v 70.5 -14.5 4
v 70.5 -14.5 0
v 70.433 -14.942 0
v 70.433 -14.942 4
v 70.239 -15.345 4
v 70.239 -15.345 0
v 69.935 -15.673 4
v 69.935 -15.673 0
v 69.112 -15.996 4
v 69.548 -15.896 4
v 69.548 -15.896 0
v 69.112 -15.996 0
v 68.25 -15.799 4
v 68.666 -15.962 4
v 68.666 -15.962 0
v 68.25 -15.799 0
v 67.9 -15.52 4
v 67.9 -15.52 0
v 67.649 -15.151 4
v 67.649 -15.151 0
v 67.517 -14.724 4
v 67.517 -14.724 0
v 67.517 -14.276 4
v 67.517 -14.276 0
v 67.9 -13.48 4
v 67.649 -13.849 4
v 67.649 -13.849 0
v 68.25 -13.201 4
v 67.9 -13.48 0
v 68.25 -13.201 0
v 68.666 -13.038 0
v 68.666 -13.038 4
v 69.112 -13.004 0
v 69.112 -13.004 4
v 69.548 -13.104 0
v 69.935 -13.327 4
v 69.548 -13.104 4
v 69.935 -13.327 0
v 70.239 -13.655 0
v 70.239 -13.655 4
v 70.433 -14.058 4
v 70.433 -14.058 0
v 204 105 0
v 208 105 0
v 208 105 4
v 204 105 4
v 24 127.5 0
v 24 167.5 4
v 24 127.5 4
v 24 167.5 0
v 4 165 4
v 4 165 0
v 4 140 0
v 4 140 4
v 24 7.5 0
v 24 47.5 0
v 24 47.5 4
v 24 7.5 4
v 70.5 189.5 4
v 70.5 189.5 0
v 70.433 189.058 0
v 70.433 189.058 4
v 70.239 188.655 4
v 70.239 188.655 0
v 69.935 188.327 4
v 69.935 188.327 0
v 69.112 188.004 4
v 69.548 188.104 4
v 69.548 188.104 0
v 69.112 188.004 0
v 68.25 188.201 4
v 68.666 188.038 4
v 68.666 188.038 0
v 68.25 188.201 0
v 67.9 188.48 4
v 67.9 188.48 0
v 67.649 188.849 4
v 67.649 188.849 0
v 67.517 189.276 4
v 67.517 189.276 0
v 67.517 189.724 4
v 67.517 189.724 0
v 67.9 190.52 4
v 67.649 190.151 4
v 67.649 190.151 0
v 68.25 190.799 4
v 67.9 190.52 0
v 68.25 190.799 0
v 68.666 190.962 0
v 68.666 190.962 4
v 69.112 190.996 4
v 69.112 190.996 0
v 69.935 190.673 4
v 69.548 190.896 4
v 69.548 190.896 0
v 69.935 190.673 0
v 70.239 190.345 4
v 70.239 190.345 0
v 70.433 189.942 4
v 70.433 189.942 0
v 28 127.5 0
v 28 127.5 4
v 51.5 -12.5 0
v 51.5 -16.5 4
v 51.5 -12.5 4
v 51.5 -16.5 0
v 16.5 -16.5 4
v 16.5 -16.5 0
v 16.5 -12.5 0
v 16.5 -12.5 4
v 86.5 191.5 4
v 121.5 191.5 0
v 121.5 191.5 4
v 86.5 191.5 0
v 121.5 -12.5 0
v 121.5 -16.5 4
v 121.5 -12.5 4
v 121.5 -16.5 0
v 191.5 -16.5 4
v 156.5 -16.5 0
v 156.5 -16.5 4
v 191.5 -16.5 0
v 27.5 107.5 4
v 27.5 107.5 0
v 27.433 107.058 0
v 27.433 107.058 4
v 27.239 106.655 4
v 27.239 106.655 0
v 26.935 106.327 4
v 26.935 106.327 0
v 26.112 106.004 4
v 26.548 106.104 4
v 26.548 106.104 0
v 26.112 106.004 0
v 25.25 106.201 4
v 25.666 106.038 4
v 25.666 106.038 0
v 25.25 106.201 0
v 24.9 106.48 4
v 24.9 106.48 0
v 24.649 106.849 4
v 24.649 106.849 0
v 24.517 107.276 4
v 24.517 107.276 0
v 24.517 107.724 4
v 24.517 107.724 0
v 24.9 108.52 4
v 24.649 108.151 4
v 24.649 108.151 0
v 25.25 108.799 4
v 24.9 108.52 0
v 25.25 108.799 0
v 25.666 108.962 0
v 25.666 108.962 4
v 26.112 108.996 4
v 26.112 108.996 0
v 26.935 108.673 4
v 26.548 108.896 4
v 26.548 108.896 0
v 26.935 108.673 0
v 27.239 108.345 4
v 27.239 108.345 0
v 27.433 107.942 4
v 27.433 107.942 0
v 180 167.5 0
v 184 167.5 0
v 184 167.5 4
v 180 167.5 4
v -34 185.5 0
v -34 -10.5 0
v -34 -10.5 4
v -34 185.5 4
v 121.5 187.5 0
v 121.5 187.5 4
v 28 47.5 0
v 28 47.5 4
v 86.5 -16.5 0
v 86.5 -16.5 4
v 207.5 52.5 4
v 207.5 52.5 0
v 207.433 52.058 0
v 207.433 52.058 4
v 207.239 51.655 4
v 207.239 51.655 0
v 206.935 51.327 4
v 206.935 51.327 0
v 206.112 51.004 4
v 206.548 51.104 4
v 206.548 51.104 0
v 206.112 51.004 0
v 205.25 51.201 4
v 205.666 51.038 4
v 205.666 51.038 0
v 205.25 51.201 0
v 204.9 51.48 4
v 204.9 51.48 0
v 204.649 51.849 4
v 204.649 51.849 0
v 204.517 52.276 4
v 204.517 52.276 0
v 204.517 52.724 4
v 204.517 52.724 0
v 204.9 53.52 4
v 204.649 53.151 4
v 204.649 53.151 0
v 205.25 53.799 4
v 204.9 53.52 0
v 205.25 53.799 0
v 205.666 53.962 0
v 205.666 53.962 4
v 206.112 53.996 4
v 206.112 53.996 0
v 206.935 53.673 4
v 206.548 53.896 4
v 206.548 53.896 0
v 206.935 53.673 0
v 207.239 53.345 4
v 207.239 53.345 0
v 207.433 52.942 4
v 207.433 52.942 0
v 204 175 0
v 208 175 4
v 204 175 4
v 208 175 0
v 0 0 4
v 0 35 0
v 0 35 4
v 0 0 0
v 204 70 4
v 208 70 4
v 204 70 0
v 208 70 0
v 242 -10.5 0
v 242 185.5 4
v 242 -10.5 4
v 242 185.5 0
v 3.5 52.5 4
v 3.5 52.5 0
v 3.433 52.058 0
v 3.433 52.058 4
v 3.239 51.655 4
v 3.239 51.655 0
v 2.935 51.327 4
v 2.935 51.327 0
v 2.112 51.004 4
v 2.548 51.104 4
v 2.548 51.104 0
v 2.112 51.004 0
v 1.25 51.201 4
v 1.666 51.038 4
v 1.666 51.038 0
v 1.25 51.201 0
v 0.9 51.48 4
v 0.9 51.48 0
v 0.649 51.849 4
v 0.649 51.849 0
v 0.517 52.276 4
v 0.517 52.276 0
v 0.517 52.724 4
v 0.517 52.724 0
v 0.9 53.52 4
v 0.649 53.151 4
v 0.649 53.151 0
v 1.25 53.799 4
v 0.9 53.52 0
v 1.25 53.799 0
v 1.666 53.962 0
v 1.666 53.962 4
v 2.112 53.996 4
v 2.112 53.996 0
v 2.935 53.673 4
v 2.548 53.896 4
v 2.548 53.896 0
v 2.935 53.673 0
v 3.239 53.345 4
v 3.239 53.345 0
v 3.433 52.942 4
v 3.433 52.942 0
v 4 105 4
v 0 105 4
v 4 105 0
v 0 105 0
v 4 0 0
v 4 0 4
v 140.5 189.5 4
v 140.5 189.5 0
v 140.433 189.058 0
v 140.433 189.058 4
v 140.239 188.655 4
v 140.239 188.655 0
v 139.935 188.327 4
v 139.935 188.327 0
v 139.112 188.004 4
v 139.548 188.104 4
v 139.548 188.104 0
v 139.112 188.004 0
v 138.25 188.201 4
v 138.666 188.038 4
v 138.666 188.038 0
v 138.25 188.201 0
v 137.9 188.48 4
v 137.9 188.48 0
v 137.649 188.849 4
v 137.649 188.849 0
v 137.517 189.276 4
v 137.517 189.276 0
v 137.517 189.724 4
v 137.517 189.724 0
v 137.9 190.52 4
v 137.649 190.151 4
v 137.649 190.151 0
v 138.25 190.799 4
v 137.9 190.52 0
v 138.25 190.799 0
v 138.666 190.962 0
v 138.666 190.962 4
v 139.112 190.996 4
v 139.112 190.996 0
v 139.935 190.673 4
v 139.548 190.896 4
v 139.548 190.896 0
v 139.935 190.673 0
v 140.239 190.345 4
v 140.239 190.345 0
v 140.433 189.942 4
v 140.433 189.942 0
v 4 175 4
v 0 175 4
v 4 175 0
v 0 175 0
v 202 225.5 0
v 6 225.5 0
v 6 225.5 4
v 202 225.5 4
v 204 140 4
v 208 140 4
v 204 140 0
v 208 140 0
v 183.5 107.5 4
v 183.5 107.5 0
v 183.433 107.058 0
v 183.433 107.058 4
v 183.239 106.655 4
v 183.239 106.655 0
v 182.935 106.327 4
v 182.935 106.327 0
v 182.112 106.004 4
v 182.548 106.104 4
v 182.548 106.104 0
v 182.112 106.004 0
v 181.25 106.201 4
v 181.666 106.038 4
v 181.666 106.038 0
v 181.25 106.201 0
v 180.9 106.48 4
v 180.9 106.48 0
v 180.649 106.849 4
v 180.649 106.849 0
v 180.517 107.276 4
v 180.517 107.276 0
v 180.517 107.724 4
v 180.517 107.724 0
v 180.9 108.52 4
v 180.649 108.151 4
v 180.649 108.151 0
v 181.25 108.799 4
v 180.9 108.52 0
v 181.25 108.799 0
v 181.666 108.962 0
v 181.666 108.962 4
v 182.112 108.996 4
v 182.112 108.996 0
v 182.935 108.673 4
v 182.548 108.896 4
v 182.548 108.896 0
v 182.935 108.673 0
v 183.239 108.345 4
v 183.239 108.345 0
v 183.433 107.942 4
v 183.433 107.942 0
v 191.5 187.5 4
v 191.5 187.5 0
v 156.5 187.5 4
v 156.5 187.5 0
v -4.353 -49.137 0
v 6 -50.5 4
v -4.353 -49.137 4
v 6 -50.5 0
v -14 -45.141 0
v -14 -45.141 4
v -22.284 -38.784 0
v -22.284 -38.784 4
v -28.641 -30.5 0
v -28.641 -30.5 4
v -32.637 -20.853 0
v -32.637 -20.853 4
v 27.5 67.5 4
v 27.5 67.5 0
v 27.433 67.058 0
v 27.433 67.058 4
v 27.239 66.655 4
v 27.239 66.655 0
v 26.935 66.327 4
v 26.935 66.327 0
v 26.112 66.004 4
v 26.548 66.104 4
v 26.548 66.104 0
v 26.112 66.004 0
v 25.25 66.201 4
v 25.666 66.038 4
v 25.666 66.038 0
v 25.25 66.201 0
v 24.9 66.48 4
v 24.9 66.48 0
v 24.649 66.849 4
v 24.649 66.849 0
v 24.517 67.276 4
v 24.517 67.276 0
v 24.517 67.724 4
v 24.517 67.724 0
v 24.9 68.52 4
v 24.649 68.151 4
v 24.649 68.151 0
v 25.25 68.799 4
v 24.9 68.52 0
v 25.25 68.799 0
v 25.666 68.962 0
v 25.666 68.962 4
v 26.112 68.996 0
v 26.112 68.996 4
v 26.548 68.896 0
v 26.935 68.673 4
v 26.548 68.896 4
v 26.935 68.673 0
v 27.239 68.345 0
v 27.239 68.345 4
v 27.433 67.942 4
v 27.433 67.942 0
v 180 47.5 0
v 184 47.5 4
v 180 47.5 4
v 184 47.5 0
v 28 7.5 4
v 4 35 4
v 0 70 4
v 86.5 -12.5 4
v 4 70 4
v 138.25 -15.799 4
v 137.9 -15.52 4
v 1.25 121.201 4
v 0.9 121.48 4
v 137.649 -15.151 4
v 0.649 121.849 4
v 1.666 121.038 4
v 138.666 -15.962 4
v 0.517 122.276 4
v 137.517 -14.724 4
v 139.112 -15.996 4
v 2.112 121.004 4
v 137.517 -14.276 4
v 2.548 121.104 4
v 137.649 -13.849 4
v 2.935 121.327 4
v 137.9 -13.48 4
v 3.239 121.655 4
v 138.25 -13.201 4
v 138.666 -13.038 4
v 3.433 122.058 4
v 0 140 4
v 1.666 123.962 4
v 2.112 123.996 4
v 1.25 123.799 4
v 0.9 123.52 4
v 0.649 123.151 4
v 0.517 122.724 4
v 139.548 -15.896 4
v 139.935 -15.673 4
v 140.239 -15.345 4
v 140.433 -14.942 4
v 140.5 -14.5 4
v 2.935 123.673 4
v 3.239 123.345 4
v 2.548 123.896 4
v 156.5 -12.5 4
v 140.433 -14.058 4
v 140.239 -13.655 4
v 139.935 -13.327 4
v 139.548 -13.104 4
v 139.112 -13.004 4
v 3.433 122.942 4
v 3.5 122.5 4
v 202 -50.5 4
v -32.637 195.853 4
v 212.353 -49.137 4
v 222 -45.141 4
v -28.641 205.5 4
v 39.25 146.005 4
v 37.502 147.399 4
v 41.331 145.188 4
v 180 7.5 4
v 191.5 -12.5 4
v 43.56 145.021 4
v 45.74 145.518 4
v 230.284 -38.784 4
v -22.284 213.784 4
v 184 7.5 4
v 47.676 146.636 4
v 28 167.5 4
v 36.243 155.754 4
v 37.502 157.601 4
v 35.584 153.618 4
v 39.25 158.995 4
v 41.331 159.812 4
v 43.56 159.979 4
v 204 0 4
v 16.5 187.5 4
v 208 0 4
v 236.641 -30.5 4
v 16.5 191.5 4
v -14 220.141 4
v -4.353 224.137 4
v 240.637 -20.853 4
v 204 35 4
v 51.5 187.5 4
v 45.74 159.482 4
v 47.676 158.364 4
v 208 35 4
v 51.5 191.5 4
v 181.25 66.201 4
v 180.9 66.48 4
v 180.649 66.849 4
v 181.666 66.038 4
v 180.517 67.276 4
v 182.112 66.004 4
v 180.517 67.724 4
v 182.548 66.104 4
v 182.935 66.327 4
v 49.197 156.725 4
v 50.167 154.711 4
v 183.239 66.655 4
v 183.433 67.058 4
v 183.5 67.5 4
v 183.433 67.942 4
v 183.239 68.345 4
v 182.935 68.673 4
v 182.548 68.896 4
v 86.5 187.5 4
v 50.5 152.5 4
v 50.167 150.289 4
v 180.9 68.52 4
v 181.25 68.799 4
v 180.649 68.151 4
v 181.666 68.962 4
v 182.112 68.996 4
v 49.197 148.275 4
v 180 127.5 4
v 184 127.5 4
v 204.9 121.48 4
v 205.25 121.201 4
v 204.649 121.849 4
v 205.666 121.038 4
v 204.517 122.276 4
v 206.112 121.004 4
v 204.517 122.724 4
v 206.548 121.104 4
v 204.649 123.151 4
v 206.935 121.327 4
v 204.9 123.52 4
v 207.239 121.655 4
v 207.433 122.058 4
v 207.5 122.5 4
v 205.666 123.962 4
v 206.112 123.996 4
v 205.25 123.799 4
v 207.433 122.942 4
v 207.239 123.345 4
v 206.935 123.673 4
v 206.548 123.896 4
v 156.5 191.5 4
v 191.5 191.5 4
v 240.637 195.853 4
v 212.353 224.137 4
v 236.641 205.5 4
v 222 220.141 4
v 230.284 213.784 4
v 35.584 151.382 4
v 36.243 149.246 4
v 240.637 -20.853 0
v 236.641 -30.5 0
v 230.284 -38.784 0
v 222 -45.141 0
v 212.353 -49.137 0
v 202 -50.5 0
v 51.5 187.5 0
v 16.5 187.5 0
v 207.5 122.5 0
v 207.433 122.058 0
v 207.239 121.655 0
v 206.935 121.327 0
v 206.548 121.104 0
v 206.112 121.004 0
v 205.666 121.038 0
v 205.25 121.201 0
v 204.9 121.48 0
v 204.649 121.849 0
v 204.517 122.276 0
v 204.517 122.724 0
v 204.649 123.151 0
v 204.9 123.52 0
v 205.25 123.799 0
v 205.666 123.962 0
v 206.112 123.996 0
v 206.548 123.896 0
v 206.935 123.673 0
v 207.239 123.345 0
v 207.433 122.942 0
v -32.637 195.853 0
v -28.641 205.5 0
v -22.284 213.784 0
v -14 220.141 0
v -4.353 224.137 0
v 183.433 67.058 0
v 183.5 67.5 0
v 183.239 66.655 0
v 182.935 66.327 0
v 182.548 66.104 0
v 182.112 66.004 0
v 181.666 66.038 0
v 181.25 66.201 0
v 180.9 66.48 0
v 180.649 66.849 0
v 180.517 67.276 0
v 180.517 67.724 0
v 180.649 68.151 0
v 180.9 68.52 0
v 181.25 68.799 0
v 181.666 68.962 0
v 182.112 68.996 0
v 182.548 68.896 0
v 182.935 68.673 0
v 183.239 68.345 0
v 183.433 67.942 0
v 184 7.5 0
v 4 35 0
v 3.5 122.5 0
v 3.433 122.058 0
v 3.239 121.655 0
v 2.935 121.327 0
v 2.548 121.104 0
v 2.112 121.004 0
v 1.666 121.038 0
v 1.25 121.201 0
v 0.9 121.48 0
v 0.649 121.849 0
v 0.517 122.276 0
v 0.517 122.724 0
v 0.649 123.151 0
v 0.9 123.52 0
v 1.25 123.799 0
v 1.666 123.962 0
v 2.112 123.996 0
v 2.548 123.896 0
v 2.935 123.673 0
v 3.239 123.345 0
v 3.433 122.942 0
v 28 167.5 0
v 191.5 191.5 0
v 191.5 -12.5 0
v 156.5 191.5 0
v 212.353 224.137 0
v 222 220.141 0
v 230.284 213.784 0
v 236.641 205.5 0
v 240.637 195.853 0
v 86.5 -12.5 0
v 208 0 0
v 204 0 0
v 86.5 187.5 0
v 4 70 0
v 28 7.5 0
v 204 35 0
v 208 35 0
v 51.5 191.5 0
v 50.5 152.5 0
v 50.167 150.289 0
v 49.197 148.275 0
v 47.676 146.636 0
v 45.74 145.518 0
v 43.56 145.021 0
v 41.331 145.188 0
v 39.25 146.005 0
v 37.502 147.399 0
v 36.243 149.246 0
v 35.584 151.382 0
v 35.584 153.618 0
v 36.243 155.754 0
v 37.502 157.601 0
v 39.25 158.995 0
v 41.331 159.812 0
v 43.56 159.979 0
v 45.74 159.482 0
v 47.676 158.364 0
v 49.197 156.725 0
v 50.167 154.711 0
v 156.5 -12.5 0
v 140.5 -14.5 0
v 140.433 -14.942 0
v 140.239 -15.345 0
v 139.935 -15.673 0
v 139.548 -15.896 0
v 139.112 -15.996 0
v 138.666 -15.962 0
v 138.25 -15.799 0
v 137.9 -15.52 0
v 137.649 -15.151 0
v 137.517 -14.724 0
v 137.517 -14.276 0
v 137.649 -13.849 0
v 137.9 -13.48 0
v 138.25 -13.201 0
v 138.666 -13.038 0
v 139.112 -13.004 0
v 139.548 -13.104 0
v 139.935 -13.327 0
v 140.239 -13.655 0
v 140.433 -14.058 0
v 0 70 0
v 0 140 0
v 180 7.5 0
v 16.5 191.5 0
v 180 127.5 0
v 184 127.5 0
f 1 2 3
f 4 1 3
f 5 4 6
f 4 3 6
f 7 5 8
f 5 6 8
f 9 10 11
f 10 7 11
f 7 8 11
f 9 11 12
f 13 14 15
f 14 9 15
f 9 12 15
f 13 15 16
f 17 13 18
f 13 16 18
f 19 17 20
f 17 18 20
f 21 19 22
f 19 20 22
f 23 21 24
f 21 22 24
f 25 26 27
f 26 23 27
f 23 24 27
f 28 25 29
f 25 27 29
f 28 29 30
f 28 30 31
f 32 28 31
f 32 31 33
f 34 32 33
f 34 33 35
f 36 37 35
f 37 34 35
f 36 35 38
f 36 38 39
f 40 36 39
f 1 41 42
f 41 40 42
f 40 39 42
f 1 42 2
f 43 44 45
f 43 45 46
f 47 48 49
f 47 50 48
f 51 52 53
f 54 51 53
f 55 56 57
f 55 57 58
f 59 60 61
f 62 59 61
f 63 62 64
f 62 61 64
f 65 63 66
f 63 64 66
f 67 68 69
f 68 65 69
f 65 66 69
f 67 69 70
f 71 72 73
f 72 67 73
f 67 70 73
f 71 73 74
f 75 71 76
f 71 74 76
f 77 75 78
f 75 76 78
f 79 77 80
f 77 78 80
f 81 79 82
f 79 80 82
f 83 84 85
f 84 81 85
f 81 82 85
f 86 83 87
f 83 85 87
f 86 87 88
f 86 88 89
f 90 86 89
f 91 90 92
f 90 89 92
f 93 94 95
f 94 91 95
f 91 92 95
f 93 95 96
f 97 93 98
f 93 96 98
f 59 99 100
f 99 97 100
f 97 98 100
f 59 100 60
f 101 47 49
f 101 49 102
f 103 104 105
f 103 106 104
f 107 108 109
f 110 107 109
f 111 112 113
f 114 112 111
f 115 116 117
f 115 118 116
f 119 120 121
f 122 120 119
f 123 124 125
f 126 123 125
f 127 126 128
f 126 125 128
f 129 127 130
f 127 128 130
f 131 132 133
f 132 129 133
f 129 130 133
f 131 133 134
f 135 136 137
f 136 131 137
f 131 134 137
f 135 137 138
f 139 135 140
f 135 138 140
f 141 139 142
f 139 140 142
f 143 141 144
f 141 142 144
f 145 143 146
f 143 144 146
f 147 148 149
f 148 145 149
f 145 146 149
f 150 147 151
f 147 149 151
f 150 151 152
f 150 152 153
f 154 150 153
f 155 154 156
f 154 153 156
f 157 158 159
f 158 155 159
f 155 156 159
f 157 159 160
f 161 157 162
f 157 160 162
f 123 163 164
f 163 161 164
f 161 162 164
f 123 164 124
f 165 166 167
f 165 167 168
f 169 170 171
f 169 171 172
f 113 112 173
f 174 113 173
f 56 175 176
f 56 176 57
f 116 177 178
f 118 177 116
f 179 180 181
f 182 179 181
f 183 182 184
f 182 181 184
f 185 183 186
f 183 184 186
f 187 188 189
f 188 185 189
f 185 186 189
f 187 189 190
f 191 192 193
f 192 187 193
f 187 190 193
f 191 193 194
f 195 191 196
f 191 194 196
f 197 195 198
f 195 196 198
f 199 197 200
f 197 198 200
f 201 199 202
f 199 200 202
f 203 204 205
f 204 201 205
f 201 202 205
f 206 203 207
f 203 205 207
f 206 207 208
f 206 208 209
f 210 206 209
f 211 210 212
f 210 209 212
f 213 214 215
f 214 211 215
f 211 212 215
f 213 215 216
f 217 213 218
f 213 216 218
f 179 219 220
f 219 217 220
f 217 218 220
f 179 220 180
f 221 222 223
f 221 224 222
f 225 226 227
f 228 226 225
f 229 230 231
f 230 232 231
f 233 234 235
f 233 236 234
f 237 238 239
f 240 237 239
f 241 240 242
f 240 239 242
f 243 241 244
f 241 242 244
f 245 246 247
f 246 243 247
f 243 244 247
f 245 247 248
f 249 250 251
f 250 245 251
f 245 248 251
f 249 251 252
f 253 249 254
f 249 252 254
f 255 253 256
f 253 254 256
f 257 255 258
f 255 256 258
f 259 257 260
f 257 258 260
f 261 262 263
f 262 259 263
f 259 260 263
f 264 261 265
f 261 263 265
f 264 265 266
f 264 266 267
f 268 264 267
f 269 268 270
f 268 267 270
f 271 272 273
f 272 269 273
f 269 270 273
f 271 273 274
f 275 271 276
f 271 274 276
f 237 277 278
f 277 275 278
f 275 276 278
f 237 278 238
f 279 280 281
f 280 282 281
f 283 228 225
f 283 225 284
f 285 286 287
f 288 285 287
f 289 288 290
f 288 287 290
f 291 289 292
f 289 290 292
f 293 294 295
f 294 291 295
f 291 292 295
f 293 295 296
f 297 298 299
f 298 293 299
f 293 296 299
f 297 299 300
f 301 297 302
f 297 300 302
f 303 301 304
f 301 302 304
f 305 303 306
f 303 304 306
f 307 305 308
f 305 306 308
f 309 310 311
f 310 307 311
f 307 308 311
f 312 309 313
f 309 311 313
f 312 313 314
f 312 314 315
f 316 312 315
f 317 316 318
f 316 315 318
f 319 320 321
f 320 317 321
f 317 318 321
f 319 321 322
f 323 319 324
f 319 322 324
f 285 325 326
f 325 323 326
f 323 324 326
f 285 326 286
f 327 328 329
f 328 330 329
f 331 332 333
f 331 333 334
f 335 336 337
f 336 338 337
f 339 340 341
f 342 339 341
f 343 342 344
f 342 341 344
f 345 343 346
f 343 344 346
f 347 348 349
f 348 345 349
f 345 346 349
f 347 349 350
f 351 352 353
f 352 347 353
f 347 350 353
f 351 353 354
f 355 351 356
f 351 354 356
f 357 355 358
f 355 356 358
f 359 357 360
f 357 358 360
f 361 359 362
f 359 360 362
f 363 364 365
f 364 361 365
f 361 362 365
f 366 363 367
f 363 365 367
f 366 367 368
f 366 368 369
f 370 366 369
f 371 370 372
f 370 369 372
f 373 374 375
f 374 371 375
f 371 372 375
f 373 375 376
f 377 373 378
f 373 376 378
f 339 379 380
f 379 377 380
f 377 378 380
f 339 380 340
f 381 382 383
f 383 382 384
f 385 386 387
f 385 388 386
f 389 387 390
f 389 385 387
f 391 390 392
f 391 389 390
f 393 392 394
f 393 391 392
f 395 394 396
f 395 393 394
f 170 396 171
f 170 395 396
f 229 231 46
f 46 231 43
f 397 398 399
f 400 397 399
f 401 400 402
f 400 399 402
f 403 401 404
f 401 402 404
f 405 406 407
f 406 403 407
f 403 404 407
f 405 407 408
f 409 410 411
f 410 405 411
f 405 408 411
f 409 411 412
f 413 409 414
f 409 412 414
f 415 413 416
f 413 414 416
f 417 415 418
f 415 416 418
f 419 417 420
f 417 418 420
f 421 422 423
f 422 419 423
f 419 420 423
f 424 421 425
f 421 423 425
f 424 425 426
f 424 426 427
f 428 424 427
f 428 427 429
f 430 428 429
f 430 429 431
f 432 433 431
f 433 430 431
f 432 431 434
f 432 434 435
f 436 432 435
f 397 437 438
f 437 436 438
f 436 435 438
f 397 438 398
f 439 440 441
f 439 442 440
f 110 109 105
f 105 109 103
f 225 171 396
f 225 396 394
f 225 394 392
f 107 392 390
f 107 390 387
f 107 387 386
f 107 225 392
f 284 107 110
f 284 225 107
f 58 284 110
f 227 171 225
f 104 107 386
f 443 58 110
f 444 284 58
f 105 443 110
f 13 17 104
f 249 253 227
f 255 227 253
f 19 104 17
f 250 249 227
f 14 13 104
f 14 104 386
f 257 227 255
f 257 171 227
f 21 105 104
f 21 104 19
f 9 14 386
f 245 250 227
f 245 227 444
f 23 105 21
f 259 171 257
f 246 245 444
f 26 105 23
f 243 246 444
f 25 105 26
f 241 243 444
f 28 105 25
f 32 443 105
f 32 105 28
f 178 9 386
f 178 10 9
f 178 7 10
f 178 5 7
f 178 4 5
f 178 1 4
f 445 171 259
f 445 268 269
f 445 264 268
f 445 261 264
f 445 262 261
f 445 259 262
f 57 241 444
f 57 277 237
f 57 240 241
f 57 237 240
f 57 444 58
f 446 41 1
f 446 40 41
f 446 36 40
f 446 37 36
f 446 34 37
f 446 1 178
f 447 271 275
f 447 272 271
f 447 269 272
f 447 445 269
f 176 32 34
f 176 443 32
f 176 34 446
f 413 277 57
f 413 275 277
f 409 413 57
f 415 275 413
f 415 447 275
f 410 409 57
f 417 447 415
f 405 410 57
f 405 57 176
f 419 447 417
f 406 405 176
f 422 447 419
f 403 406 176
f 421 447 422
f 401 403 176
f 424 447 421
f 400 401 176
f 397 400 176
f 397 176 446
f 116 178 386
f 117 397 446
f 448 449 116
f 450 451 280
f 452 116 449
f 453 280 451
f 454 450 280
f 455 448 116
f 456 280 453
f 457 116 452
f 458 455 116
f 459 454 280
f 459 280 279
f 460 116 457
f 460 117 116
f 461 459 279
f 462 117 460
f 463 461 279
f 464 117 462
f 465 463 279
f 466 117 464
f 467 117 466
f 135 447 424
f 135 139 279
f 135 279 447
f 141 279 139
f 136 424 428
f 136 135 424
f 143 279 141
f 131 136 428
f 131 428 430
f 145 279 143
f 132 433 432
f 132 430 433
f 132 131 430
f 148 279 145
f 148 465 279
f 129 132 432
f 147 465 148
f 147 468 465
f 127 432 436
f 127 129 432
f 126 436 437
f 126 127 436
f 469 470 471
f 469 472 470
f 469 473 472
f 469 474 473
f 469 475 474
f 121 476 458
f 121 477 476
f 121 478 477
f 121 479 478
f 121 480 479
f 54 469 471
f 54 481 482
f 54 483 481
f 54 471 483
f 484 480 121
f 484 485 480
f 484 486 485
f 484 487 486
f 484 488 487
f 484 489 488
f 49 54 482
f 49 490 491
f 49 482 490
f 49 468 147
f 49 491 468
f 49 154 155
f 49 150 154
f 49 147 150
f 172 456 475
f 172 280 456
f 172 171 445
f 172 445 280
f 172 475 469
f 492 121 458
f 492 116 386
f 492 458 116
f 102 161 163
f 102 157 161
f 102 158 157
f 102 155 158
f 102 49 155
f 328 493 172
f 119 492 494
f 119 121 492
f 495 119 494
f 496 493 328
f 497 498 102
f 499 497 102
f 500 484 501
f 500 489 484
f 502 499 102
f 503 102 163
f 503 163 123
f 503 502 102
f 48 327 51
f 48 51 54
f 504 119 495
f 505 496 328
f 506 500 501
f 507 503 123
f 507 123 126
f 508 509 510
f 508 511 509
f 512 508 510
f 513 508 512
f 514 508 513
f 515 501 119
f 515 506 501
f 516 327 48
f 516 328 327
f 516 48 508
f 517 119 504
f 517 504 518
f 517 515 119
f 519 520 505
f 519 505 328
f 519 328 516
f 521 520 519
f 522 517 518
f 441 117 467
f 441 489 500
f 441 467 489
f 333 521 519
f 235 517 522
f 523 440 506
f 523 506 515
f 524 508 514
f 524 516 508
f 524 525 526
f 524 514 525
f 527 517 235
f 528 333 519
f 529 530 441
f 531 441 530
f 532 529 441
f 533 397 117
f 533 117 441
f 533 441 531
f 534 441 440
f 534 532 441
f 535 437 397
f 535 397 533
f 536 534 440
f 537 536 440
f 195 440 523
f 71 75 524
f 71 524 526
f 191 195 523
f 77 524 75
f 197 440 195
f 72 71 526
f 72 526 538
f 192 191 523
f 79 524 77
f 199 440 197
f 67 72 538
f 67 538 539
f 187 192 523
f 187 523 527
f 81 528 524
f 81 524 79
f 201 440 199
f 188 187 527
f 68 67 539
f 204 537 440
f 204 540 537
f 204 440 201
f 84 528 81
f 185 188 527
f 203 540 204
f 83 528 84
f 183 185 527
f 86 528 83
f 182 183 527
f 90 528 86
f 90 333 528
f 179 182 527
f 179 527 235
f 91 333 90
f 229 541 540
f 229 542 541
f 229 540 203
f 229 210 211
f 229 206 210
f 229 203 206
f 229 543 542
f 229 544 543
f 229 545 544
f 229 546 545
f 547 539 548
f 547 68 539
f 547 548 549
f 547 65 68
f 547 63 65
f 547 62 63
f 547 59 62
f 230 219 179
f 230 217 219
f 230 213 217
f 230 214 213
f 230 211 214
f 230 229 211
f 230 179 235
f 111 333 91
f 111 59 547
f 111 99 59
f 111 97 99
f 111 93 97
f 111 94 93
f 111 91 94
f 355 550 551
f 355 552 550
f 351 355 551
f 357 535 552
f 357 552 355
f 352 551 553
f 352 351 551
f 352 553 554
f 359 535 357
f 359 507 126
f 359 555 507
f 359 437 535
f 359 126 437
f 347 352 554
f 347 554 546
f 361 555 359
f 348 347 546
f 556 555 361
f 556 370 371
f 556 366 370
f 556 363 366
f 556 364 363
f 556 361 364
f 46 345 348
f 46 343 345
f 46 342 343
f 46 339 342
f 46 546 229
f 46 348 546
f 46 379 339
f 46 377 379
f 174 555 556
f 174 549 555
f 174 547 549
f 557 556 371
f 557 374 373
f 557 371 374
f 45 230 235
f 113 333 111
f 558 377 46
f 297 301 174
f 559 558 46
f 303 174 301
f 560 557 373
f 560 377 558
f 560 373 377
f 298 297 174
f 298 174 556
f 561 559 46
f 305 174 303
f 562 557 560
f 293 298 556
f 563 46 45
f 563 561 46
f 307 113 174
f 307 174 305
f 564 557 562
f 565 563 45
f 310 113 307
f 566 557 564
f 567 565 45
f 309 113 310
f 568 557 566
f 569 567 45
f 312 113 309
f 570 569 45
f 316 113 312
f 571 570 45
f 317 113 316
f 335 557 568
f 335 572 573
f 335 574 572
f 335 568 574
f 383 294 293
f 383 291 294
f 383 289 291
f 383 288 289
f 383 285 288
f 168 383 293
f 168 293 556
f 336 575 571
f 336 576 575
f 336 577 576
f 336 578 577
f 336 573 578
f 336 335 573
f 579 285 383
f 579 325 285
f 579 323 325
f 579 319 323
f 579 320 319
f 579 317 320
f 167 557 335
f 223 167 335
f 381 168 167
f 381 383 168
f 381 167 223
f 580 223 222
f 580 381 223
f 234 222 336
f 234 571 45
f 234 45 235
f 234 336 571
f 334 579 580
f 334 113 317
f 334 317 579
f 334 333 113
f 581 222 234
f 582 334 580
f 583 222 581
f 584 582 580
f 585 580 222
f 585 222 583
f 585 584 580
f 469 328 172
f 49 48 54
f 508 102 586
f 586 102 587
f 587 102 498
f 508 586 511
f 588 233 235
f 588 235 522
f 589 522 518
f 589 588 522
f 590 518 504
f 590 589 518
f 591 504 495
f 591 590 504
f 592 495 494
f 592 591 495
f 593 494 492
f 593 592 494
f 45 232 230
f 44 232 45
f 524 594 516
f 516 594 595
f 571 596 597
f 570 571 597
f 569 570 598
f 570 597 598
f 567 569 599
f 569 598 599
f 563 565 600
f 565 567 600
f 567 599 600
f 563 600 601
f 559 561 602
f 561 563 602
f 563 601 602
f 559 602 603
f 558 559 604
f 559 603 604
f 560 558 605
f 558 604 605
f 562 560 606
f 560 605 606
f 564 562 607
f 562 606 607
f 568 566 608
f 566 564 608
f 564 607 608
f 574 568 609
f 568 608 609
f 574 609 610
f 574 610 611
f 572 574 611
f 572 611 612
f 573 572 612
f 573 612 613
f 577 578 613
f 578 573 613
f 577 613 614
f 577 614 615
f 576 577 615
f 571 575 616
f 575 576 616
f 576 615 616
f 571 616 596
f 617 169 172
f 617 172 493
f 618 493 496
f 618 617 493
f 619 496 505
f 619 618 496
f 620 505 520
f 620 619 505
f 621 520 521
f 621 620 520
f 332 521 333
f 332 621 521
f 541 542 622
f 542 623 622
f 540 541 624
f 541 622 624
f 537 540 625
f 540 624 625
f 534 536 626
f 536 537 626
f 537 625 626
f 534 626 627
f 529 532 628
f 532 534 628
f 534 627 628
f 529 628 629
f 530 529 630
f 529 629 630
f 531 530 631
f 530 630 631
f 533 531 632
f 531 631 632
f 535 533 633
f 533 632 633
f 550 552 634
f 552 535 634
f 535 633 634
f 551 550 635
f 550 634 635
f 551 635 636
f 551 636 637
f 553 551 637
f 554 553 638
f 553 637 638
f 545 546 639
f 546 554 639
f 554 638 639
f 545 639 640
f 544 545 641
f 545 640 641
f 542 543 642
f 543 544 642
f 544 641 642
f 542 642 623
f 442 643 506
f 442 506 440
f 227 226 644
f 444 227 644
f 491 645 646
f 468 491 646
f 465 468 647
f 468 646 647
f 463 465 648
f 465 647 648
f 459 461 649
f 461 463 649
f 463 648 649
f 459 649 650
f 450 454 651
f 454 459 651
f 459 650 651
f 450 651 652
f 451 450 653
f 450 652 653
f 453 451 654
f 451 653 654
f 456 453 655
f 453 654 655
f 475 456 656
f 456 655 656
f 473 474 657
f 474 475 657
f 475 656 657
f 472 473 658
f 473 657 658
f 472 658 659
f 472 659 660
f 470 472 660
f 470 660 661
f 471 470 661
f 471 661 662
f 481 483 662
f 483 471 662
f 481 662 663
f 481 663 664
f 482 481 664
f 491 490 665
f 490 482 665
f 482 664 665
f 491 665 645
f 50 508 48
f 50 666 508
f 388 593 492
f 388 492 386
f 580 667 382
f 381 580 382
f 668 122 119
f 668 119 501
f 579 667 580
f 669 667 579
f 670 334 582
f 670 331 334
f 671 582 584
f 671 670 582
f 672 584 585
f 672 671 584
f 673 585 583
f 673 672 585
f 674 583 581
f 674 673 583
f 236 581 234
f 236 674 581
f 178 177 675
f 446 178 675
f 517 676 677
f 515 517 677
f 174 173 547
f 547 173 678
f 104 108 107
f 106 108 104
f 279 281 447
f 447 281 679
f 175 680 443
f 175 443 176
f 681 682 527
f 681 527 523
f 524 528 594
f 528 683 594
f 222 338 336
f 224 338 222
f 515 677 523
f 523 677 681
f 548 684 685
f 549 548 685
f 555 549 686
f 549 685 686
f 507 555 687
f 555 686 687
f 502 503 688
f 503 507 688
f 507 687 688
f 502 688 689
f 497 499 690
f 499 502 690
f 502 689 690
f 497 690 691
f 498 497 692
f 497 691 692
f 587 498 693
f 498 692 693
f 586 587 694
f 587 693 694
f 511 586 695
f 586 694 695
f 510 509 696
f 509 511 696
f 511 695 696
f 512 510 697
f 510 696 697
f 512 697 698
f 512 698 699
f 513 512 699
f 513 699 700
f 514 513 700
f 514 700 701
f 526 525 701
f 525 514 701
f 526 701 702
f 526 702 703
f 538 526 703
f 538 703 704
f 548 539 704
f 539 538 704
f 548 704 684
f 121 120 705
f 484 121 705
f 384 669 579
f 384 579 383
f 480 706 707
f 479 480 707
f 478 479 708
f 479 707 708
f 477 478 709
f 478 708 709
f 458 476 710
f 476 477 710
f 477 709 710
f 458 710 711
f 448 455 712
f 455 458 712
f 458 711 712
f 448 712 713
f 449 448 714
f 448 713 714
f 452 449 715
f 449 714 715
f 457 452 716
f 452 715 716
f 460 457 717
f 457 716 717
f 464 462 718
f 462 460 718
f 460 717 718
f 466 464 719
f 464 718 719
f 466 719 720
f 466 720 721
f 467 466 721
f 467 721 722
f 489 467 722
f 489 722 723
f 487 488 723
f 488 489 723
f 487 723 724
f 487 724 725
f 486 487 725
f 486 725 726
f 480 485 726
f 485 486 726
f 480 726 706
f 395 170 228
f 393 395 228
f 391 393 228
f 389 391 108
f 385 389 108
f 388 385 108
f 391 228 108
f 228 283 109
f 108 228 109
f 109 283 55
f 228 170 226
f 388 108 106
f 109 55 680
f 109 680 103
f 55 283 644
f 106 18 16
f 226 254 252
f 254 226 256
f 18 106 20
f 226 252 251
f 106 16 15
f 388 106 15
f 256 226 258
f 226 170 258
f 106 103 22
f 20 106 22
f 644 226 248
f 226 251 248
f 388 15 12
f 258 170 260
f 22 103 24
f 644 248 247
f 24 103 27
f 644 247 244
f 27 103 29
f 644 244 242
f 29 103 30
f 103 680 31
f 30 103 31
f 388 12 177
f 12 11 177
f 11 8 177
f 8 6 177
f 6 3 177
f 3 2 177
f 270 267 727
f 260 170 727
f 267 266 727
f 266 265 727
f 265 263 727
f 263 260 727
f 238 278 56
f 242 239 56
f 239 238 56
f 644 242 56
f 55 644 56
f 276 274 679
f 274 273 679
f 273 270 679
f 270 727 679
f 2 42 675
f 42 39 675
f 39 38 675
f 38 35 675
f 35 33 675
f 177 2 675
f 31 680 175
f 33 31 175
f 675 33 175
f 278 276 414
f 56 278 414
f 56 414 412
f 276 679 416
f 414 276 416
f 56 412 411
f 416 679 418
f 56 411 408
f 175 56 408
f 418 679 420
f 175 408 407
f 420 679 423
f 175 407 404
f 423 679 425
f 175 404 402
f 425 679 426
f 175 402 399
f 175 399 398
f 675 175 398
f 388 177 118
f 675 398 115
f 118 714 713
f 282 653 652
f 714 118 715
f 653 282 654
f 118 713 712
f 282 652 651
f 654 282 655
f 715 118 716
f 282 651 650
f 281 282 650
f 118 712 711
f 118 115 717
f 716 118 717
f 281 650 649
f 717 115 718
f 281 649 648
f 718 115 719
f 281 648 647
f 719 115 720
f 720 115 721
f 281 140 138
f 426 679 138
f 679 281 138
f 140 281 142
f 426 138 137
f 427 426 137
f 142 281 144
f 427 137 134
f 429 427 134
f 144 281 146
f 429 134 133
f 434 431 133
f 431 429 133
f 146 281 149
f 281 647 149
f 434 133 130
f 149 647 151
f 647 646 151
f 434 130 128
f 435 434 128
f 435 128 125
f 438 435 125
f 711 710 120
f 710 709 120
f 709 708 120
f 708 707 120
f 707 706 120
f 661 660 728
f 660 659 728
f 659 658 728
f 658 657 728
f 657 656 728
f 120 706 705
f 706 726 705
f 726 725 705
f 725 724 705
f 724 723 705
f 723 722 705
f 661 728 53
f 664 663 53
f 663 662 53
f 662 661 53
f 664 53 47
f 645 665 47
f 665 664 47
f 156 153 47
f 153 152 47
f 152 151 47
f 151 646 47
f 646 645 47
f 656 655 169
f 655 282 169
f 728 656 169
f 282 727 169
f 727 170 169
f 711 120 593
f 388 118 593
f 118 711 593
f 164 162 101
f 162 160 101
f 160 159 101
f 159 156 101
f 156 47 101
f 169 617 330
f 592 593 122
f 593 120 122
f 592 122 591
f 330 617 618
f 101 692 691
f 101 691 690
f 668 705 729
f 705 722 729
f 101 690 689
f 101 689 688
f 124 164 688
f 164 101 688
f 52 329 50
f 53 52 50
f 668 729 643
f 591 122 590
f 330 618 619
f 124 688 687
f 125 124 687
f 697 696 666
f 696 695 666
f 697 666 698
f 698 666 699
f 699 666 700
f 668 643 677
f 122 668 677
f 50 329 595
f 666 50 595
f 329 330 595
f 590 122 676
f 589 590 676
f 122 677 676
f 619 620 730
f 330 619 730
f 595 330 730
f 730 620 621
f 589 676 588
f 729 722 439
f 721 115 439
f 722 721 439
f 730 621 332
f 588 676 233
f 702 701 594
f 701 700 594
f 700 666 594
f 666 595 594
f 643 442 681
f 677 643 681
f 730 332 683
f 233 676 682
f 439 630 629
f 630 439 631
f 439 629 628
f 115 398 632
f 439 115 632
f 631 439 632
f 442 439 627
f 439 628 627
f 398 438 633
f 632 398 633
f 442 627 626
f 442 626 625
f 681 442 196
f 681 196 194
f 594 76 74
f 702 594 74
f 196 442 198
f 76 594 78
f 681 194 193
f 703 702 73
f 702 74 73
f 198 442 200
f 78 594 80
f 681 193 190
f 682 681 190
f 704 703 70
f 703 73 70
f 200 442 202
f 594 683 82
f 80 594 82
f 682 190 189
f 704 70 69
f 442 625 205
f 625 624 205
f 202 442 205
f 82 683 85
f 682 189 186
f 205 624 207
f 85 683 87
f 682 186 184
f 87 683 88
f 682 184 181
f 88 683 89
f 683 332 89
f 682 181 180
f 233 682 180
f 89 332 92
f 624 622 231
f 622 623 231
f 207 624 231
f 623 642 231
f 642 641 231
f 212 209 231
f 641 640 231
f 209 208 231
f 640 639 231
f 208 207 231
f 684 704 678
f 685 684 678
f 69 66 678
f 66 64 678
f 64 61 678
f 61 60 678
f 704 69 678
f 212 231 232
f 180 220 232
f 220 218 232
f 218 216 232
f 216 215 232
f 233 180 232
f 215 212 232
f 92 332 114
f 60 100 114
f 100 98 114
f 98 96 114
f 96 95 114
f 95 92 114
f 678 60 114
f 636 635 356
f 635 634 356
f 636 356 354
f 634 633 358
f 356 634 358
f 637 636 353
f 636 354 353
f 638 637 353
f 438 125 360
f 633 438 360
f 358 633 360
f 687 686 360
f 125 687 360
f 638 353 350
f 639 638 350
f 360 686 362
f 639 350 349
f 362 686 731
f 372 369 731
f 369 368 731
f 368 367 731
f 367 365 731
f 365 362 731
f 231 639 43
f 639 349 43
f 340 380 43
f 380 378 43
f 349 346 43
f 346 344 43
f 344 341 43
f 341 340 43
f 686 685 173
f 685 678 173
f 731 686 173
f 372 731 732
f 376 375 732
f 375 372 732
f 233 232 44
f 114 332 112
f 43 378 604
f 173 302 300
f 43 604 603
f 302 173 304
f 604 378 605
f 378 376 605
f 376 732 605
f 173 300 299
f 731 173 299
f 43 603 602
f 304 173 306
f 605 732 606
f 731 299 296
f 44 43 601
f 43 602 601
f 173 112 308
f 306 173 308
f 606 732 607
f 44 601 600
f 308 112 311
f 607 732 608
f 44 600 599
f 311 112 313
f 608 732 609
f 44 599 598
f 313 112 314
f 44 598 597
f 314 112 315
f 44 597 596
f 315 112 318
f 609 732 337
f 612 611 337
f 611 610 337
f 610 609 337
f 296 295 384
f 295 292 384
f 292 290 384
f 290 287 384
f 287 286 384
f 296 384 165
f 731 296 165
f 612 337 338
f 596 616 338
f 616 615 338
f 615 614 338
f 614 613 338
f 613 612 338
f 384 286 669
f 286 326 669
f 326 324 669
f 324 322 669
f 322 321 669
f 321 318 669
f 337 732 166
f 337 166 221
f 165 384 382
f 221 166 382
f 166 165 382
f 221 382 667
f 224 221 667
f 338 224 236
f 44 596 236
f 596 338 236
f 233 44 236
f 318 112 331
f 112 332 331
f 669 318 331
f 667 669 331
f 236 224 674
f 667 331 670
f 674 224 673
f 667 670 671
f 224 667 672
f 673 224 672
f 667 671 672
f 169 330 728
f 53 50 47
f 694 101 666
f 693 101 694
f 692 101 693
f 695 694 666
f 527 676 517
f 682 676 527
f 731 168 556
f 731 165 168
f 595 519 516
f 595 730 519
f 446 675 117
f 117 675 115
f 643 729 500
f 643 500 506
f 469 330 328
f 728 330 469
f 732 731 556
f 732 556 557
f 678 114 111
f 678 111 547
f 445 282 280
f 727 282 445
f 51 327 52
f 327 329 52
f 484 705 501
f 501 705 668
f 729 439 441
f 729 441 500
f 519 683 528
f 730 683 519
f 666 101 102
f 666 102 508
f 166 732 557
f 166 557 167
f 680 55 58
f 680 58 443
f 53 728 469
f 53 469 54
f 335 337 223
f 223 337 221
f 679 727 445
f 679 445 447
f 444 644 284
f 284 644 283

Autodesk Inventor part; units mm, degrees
ref_plane "YZ Plane" through (0, 0, 0) normal (1, 0, 0) x (0, 1, 0)
ref_plane "XZ Plane" through (0, 0, 0) normal (0, 1, 0) x (-1, 0, 0)
ref_plane "XY Plane" through (0, 0, 0) normal (0, 0, 1) x (1, 0, 0)
sketch "Sketch1" plane through (0, 0, 0) normal (0, 0, 1) x (1, 0, 0)
  line L0 (6, 225.5) -> (202, 225.5)
  line L1 (242, 185.5) -> (242, -10.5)
  line L2 (202, -50.5) -> (6, -50.5)
  line L3 (-34, -10.5) -> (-34, 185.5)
  line L4 (208, 237.5) -> (0, 237.5) construction
  line L5 (-46, 191.5) -> (-46, -16.5) construction
  arc A0 (0, 237.5) -> (-46, 191.5) centre (0, 191.5) ccw construction
  arc A1 (6, 225.5) -> (-34, 185.5) centre (6, 185.5) ccw
  arc A2 (242, 185.5) -> (202, 225.5) centre (202, 185.5) ccw
  arc A3 (202, -50.5) -> (242, -10.5) centre (202, -10.5) ccw
  arc A4 (-34, -10.5) -> (6, -50.5) centre (6, -10.5) ccw
  line L6 (51.5, 191.5) -> (16.5, 191.5) projected
  line L7 (16.5, 191.5) -> (16.5, 187.5) projected
  line L8 (51.5, 187.5) -> (16.5, 187.5) projected
  line L9 (51.5, 191.5) -> (51.5, 187.5) projected
  line L10 (121.5, 191.5) -> (86.5, 191.5) projected
  line L11 (86.5, 191.5) -> (86.5, 187.5) projected
  line L12 (121.5, 187.5) -> (86.5, 187.5) projected
  line L13 (121.5, 191.5) -> (121.5, 187.5) projected
  line L14 (191.5, 191.5) -> (156.5, 191.5) projected
  line L15 (156.5, 191.5) -> (156.5, 187.5) projected
  line L16 (191.5, 187.5) -> (156.5, 187.5) projected
  line L17 (191.5, 191.5) -> (191.5, 187.5) projected
  line L18 (208, 140) -> (208, 175) projected
  line L19 (208, 175) -> (204, 175) projected
  line L20 (204, 140) -> (204, 175) projected
  line L21 (208, 140) -> (204, 140) projected
  line L22 (208, 70) -> (208, 105) projected
  line L23 (208, 105) -> (204, 105) projected
  line L24 (204, 70) -> (204, 105) projected
  line L25 (208, 70) -> (204, 70) projected
  line L26 (208, 0) -> (208, 35) projected
  line L27 (208, 35) -> (204, 35) projected
  line L28 (204, 0) -> (204, 35) projected
  line L29 (208, 0) -> (204, 0) projected
  line L30 (156.5, -16.5) -> (191.5, -16.5) projected
  line L31 (191.5, -16.5) -> (191.5, -12.5) projected
  line L32 (156.5, -12.5) -> (191.5, -12.5) projected
  line L33 (156.5, -16.5) -> (156.5, -12.5) projected
  line L34 (86.5, -16.5) -> (121.5, -16.5) projected
  line L35 (121.5, -16.5) -> (121.5, -12.5) projected
  line L36 (86.5, -12.5) -> (121.5, -12.5) projected
  line L37 (86.5, -16.5) -> (86.5, -12.5) projected
  line L38 (16.5, -16.5) -> (51.5, -16.5) projected
  line L39 (51.5, -16.5) -> (51.5, -12.5) projected
  line L40 (16.5, -12.5) -> (51.5, -12.5) projected
  line L41 (16.5, -16.5) -> (16.5, -12.5) projected
  line L42 (0, 35) -> (0, 0) projected
  line L43 (0, 0) -> (4, 0) projected
  line L44 (4, 35) -> (4, 0) projected
  line L45 (0, 35) -> (4, 35) projected
  line L46 (0, 105) -> (0, 70) projected
  line L47 (0, 70) -> (4, 70) projected
  line L48 (4, 105) -> (4, 70) projected
  line L49 (0, 105) -> (4, 105) projected
  line L50 (0, 175) -> (0, 140) projected
  line L51 (0, 140) -> (4, 140) projected
  line L52 (4, 175) -> (4, 140) projected
  line L53 (0, 175) -> (4, 175) projected
  circle A5 centre (43, 152.5) radius 7.5
  line L54 (4, 180) -> (4, 165) projected
  line L55 (24, 7.5) -> (28, 7.5)
  line L56 (28, 7.5) -> (28, 47.5)
  line L57 (28, 47.5) -> (24, 47.5)
  line L58 (24, 47.5) -> (24, 7.5)
  line L59 (180, 7.5) -> (184, 7.5)
  line L60 (184, 7.5) -> (184, 47.5)
  line L61 (184, 47.5) -> (180, 47.5)
  line L62 (180, 47.5) -> (180, 7.5)
  line L63 (180, 127.5) -> (184, 127.5)
  line L64 (184, 127.5) -> (184, 167.5)
  line L65 (184, 167.5) -> (180, 167.5)
  line L66 (180, 167.5) -> (180, 127.5)
  line L67 (24, 127.5) -> (28, 127.5)
  line L68 (28, 127.5) -> (28, 167.5)
  line L69 (28, 167.5) -> (24, 167.5)
  line L70 (24, 167.5) -> (24, 127.5)
  line L71 (104, 187.5) -> (104, -12.5) construction
  circle A6 centre (26, 107.5) radius 1.5
  circle A7 centre (26, 67.5) radius 1.5
  circle A8 centre (182, 107.5) radius 1.5
  circle A9 centre (182, 67.5) radius 1.5
  line L72 (26, 127.5) -> (26, 107.5) construction
  line L73 (26, 67.5) -> (26, 47.5) construction
  line L74 (26, 107.5) -> (26, 87.5) construction
  line L75 (26, 87.5) -> (26, 67.5) construction
  line L76 (51.5, 191.5) -> (86.5, 187.5) construction
  line L77 (121.5, 187.5) -> (156.5, 191.5) construction
  circle A10 centre (69, 189.5) radius 1.5
  circle A11 centre (139, 189.5) radius 1.5
  circle A12 centre (2, 122.5) radius 1.5
  circle A13 centre (2, 52.5) radius 1.5
  circle A14 centre (69, -14.5) radius 1.5
  circle A15 centre (139, -14.5) radius 1.5
  circle A16 centre (206, 52.5) radius 1.5
  circle A17 centre (206, 122.5) radius 1.5
  point P0 (104, 237.5)
  point P1 (104, 225.5)
  point P2 (-34, 87.5)
  point P3 (-46, 87.5)
  point P4 (-24, 191.5)
  point P5 (4, 172.5)
  point P6 (182, 127.5)
  point P7 (182, 47.5)
  point P8 (104, 87.5)
  dimension "d0" = 10
  dimension "d2" = 40
  dimension "d4" = 15
  dimension "d6" = 4
  dimension "d7" = 40
  dimension "d9" = 20
  dimension "d10" = 4
  dimension "d11" = 40
  dimension "d12" = 4
  dimension "d13" = 40
  dimension "d14" = 4
  dimension "d15" = 40
  dimension "d16" = 20
  dimension "d17" = 15
  dimension "d18" = 15
  dimension "d19" = 20
  dimension "d22" = 3
  dimension "d24" = 3
  dimension "d27" = 360
extrude "Extrusion1" add sketch "Sketch1" along normal blind 4
properties part number "Cover" material "MDF Medium Density Fiberboard"
